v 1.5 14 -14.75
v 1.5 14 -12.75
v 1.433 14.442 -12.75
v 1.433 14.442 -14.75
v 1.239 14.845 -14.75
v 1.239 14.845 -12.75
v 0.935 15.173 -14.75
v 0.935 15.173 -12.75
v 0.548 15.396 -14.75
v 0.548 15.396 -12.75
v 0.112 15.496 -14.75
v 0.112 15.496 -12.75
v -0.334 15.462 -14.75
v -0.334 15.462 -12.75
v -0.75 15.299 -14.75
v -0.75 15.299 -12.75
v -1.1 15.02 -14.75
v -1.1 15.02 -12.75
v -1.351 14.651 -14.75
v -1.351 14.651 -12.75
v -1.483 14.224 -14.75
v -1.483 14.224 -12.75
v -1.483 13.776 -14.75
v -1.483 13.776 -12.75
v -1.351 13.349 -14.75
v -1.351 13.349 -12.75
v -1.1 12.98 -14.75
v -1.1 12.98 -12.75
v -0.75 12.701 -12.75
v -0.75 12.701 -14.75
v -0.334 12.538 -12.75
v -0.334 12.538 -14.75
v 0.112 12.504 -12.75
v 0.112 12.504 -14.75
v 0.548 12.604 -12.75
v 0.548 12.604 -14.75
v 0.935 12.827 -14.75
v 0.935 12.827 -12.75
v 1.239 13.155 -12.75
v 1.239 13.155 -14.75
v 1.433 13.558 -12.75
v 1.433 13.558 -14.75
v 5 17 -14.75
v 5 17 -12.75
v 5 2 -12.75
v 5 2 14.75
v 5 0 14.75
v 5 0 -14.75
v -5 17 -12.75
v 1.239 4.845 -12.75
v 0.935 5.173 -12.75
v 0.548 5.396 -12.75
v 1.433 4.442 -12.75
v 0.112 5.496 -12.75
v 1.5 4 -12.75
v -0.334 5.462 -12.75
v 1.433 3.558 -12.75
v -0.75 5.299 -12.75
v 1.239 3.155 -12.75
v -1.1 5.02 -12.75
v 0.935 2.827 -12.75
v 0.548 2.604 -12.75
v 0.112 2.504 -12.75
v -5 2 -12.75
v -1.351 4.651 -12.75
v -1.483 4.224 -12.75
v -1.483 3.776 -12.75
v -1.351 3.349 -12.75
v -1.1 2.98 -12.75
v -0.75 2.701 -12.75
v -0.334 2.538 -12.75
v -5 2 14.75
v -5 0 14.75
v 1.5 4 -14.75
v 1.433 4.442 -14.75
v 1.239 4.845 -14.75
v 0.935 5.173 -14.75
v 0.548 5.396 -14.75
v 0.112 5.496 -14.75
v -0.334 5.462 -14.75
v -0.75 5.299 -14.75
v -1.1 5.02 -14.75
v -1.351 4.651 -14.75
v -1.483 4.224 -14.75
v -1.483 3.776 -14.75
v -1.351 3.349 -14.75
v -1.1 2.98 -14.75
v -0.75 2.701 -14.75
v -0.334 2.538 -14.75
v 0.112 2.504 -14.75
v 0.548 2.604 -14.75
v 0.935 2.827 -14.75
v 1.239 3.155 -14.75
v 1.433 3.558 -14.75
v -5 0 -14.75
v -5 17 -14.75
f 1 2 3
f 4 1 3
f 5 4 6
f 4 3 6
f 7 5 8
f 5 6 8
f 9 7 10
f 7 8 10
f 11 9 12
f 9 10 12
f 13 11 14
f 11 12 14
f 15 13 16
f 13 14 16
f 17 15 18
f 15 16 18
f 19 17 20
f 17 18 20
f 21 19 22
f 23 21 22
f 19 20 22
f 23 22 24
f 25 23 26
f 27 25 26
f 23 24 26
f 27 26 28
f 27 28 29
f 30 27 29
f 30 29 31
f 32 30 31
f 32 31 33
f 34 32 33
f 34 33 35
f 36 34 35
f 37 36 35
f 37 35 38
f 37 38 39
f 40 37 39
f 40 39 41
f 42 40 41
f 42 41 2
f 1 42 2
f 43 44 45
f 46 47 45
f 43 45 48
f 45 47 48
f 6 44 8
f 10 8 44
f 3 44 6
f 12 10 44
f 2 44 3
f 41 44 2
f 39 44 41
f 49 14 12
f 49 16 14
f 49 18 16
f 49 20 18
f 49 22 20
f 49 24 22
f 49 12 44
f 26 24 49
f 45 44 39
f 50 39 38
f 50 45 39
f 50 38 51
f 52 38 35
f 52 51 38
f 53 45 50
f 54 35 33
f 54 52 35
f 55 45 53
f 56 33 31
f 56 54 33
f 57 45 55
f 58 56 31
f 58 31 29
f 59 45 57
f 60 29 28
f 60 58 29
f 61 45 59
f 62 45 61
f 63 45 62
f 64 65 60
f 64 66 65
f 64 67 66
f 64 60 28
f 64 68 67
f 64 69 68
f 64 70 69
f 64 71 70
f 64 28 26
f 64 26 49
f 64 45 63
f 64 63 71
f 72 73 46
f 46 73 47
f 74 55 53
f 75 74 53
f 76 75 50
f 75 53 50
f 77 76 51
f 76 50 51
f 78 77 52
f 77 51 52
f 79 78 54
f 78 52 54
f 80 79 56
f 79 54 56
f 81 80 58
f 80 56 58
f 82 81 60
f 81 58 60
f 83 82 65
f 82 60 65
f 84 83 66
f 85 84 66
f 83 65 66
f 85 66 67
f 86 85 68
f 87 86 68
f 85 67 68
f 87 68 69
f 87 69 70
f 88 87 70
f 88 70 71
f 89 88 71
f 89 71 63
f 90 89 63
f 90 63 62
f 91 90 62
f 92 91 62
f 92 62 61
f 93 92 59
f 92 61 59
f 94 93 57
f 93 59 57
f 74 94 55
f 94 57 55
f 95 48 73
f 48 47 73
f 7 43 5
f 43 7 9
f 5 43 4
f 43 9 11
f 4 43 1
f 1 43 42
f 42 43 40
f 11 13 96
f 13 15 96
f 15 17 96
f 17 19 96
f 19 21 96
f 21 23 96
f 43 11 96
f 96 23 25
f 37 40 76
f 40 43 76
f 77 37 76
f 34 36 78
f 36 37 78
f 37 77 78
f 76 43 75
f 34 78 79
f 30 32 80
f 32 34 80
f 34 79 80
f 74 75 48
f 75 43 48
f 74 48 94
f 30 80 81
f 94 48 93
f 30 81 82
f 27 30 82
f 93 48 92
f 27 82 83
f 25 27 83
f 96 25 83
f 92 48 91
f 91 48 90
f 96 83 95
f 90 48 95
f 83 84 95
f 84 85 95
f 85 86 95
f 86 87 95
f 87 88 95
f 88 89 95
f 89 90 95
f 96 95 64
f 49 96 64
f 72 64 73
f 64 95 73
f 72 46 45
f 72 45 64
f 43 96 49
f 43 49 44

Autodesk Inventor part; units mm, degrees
ref_plane "YZ Plane" through (0, 0, 0) normal (1, 0, 0) x (0, 1, 0)
ref_plane "XZ Plane" through (0, 0, 0) normal (0, 1, 0) x (-1, 0, 0)
ref_plane "XY Plane" through (0, 0, 0) normal (0, 0, 1) x (1, 0, 0)
sketch "Sketch1" plane through (0, 0, 0) normal (0, 1, 0) x (-1, 0, 0)
  line L0 (5, 14.75) -> (-5, 14.75)
  line L1 (-5, 14.75) -> (-5, -14.75)
  line L2 (-5, -14.75) -> (5, -14.75)
  line L3 (5, -14.75) -> (5, 14.75)
  line L4 (5, 14.75) -> (-5, -14.75) construction
  line L5 (-5, 14.75) -> (5, -14.75) construction
  point P0 (0, 0)
  dimension "d0" = 10
  dimension "d1" = 29.5
extrude "Extrusion1" add sketch "Sketch1" along normal blind 2
sketch "Sketch2" plane through (0, 2, 0) normal (0, 1, 0) x (1, 0, 0)
  line L0 (5, 14.75) -> (-5, 14.75) projected
  line L1 (5, -14.75) -> (5, 14.75) projected
  line L2 (-5, 14.75) -> (5, 14.75)
  line L3 (5, 14.75) -> (5, 12.75)
  line L4 (5, 12.75) -> (-5, 12.75)
  line L5 (-5, 12.75) -> (-5, 14.75)
  point P0 (0, 0)
  dimension "d4" = 2
extrude "Extrusion2" add sketch "Sketch2" along normal blind 15
sketch "Sketch3" plane through (-5, 2, -12.75) normal (0, 0, 1) x (1, 0, 0)
  circle A0 centre (5, 12) radius 1.5
  circle A1 centre (5, 2) radius 1.5
  line L0 (0, 0) -> (10, 0) projected
  point P0 (5, -2)
  dimension "d7" = 3
  dimension "d8" = 3
  dimension "d9" = 2
  dimension "d10" = 10
extrude "Extrusion3" cut sketch "Sketch3" against normal blind 15
properties part number "Bracket Lifter Motor 2"
